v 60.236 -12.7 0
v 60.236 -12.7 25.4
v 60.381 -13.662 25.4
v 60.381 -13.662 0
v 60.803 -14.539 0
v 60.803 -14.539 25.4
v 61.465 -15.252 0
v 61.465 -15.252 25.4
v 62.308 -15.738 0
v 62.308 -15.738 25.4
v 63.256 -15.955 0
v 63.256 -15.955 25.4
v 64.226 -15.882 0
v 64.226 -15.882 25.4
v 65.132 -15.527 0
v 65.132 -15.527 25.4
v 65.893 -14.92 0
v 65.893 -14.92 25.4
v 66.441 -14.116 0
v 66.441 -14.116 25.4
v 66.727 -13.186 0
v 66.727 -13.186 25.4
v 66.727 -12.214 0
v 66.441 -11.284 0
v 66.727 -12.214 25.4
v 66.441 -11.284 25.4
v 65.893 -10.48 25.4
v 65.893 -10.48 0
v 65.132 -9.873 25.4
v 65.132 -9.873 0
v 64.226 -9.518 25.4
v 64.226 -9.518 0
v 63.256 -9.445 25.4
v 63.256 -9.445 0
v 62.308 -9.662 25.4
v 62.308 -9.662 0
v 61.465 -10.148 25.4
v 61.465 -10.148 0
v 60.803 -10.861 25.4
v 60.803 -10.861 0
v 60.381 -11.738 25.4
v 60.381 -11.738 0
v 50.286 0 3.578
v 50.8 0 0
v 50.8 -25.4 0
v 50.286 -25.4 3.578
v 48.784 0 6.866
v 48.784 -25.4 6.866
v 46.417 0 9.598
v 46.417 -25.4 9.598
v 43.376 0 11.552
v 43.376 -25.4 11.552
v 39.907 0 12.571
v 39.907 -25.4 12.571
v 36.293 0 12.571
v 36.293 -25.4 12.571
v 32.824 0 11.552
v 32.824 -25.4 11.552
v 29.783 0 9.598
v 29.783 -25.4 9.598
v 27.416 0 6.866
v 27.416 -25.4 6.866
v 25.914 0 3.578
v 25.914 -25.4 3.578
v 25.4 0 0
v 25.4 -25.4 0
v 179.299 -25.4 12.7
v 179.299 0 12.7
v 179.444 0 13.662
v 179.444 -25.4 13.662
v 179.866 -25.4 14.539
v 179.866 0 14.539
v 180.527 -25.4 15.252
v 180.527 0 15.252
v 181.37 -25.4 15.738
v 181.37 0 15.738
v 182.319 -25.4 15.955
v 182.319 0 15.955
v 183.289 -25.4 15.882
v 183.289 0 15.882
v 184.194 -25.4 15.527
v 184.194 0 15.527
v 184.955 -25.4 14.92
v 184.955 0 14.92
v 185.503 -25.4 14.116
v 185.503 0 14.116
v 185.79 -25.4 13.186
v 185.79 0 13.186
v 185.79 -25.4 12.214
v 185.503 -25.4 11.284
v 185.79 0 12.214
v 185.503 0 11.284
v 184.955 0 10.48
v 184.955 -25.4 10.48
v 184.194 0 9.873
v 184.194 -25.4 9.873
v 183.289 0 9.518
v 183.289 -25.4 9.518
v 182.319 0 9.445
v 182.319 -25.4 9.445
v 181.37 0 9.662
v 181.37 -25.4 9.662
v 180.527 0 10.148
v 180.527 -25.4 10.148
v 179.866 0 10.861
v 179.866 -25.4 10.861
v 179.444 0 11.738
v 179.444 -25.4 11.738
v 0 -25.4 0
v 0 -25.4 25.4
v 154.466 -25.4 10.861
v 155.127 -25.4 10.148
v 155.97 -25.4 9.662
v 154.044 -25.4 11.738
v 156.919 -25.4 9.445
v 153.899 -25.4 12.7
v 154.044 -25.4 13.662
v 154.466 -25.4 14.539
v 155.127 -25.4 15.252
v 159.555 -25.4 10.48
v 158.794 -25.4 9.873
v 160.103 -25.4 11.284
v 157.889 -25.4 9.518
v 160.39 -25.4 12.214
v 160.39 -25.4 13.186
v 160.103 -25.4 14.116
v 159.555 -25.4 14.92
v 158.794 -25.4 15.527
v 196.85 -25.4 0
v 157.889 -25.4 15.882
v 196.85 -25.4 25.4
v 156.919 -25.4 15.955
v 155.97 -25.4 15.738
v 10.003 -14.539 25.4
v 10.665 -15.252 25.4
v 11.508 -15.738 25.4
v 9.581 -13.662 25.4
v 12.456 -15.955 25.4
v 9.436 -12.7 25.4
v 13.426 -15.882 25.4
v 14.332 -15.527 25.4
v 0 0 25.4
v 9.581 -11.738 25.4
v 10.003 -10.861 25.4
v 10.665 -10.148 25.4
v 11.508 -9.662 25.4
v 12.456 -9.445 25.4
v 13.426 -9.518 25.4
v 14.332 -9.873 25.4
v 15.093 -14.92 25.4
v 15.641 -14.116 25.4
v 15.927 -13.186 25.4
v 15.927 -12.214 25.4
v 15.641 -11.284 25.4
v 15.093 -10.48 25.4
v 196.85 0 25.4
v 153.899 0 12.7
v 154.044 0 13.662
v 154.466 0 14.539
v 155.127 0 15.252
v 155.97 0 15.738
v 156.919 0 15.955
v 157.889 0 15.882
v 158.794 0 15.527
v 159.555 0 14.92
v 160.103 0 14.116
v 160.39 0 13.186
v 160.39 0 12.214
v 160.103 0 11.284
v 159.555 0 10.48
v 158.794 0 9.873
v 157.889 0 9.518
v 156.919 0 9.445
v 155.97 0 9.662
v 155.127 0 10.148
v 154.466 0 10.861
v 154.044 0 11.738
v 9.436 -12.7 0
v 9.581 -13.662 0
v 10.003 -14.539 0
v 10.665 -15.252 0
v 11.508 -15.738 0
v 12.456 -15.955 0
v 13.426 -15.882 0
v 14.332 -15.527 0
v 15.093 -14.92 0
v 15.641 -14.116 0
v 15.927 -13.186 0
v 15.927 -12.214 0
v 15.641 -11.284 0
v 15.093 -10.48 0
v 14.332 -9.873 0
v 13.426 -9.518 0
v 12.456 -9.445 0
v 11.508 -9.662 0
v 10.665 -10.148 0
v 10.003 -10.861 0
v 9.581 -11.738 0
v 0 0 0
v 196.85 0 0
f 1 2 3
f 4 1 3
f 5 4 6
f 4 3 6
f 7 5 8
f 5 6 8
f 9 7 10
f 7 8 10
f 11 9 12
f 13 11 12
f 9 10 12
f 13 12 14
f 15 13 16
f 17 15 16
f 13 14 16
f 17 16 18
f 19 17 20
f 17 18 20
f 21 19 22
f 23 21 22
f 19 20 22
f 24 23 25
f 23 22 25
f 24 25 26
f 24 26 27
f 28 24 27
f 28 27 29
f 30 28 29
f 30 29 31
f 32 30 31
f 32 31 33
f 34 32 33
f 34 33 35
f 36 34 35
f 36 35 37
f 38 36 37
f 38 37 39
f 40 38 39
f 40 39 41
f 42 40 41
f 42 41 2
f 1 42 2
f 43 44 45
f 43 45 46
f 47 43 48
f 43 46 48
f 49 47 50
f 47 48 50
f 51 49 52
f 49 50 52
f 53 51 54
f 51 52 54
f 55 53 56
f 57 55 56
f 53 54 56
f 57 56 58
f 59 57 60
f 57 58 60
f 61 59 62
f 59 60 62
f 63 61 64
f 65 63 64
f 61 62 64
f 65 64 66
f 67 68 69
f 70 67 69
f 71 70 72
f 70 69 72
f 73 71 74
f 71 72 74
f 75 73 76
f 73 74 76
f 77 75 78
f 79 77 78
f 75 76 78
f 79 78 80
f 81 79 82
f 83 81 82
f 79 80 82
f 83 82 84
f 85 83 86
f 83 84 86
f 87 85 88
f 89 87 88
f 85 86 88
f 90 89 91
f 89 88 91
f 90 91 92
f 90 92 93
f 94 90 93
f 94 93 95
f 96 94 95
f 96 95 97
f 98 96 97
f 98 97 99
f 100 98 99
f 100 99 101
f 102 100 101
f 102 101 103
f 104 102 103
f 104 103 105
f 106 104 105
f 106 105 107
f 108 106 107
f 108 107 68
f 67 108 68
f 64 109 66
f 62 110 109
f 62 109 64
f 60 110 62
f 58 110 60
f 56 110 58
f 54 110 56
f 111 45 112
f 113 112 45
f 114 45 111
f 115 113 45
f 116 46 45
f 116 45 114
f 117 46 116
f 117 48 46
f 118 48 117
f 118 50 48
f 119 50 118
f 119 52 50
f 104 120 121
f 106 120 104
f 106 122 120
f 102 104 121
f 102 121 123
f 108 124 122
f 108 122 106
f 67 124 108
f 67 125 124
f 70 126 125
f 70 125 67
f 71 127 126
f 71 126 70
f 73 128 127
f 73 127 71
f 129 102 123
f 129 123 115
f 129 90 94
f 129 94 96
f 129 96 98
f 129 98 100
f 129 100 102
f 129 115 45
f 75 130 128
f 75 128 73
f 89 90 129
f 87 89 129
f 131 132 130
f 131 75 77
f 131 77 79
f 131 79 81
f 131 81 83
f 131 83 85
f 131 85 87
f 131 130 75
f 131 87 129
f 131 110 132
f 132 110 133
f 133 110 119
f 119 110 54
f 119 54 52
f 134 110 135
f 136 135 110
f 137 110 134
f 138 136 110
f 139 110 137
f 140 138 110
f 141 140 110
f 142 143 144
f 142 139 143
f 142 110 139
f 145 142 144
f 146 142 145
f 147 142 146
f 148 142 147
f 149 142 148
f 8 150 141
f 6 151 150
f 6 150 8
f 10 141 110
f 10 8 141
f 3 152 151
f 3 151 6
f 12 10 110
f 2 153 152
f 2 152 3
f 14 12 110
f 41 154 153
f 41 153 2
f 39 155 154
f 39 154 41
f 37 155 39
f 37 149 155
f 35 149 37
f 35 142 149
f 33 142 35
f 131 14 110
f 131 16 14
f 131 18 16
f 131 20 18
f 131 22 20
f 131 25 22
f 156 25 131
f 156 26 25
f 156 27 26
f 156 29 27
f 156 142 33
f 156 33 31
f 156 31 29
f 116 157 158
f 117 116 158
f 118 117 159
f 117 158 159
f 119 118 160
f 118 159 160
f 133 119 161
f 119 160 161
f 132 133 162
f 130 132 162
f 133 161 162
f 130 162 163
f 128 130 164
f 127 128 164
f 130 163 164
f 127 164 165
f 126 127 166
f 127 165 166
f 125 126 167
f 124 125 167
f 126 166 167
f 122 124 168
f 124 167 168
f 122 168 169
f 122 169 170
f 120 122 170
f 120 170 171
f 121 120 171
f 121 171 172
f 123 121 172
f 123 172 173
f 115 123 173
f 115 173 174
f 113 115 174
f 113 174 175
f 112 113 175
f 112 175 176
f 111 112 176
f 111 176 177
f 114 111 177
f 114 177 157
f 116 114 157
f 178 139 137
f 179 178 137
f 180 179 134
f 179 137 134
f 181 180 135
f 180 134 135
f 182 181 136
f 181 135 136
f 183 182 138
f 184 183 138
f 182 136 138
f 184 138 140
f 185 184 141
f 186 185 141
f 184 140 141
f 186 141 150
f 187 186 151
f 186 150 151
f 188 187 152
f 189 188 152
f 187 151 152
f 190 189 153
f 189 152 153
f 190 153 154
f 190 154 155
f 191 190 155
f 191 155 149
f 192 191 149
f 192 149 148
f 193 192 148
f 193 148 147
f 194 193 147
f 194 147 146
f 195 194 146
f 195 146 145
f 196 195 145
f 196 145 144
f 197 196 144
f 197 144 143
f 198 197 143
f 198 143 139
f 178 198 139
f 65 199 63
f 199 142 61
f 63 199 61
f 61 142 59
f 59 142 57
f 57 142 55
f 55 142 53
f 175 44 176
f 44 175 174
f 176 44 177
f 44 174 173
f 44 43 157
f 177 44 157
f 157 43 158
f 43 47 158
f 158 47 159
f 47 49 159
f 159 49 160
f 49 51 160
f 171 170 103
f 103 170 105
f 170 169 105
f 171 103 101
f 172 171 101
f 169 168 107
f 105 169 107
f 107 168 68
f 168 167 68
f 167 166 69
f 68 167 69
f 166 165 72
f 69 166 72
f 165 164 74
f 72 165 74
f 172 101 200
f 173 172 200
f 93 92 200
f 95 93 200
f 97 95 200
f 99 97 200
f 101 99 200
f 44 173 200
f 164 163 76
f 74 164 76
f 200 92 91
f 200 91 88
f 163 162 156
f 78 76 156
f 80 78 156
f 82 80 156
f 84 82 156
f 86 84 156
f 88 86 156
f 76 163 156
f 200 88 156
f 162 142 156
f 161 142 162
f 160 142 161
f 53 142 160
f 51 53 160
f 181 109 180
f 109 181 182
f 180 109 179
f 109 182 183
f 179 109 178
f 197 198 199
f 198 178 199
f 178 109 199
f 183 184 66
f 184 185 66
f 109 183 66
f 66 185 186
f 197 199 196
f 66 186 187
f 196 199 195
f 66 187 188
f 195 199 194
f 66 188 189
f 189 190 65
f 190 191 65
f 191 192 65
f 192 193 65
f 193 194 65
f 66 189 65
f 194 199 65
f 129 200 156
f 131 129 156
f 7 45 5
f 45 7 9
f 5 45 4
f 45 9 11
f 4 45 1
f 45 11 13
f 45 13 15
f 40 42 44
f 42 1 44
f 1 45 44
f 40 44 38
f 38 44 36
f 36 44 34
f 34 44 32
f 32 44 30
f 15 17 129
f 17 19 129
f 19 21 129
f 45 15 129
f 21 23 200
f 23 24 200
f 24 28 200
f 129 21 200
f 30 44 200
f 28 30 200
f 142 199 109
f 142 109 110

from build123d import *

# Parameters (mm, degrees)
F0_W     = 196.85
F0_H     = 25.4
F1_DEPTH = 25.4
F2_R     = 12.7
F4_DEPTH = 25.4
F5_D     = 6.5278
F7_D     = 6.5278


with BuildPart() as f1:
    # F0 (on Front) → F1 (new body)
    with BuildSketch(Plane.XZ):
        with Locations((98.425, 12.7)):
            Rectangle(F0_W, F0_H)
    extrude(amount=F1_DEPTH)

    # F2 (on face) → F4 (cut)
    with BuildSketch(Plane.XZ.offset(25.4)):
        with Locations((38.1, 0)):
            Circle(F2_R)
    extrude(amount=-F4_DEPTH, mode=Mode.SUBTRACT)

    # F5 (through all)
    with Locations(Plane.XZ.offset(25.4)):
        with Locations((157.1625, 12.7), (182.5625, 12.7)):
            Hole(F5_D / 2)

    # F7 (through all)
    with Locations(Plane(origin=(0, 0, 0), x_dir=(1, 0, 0), z_dir=(0, 0, -1))):
        with Locations((12.7, 12.7), (63.5, 12.7)):
            Hole(F7_D / 2)


solid = f1.part
